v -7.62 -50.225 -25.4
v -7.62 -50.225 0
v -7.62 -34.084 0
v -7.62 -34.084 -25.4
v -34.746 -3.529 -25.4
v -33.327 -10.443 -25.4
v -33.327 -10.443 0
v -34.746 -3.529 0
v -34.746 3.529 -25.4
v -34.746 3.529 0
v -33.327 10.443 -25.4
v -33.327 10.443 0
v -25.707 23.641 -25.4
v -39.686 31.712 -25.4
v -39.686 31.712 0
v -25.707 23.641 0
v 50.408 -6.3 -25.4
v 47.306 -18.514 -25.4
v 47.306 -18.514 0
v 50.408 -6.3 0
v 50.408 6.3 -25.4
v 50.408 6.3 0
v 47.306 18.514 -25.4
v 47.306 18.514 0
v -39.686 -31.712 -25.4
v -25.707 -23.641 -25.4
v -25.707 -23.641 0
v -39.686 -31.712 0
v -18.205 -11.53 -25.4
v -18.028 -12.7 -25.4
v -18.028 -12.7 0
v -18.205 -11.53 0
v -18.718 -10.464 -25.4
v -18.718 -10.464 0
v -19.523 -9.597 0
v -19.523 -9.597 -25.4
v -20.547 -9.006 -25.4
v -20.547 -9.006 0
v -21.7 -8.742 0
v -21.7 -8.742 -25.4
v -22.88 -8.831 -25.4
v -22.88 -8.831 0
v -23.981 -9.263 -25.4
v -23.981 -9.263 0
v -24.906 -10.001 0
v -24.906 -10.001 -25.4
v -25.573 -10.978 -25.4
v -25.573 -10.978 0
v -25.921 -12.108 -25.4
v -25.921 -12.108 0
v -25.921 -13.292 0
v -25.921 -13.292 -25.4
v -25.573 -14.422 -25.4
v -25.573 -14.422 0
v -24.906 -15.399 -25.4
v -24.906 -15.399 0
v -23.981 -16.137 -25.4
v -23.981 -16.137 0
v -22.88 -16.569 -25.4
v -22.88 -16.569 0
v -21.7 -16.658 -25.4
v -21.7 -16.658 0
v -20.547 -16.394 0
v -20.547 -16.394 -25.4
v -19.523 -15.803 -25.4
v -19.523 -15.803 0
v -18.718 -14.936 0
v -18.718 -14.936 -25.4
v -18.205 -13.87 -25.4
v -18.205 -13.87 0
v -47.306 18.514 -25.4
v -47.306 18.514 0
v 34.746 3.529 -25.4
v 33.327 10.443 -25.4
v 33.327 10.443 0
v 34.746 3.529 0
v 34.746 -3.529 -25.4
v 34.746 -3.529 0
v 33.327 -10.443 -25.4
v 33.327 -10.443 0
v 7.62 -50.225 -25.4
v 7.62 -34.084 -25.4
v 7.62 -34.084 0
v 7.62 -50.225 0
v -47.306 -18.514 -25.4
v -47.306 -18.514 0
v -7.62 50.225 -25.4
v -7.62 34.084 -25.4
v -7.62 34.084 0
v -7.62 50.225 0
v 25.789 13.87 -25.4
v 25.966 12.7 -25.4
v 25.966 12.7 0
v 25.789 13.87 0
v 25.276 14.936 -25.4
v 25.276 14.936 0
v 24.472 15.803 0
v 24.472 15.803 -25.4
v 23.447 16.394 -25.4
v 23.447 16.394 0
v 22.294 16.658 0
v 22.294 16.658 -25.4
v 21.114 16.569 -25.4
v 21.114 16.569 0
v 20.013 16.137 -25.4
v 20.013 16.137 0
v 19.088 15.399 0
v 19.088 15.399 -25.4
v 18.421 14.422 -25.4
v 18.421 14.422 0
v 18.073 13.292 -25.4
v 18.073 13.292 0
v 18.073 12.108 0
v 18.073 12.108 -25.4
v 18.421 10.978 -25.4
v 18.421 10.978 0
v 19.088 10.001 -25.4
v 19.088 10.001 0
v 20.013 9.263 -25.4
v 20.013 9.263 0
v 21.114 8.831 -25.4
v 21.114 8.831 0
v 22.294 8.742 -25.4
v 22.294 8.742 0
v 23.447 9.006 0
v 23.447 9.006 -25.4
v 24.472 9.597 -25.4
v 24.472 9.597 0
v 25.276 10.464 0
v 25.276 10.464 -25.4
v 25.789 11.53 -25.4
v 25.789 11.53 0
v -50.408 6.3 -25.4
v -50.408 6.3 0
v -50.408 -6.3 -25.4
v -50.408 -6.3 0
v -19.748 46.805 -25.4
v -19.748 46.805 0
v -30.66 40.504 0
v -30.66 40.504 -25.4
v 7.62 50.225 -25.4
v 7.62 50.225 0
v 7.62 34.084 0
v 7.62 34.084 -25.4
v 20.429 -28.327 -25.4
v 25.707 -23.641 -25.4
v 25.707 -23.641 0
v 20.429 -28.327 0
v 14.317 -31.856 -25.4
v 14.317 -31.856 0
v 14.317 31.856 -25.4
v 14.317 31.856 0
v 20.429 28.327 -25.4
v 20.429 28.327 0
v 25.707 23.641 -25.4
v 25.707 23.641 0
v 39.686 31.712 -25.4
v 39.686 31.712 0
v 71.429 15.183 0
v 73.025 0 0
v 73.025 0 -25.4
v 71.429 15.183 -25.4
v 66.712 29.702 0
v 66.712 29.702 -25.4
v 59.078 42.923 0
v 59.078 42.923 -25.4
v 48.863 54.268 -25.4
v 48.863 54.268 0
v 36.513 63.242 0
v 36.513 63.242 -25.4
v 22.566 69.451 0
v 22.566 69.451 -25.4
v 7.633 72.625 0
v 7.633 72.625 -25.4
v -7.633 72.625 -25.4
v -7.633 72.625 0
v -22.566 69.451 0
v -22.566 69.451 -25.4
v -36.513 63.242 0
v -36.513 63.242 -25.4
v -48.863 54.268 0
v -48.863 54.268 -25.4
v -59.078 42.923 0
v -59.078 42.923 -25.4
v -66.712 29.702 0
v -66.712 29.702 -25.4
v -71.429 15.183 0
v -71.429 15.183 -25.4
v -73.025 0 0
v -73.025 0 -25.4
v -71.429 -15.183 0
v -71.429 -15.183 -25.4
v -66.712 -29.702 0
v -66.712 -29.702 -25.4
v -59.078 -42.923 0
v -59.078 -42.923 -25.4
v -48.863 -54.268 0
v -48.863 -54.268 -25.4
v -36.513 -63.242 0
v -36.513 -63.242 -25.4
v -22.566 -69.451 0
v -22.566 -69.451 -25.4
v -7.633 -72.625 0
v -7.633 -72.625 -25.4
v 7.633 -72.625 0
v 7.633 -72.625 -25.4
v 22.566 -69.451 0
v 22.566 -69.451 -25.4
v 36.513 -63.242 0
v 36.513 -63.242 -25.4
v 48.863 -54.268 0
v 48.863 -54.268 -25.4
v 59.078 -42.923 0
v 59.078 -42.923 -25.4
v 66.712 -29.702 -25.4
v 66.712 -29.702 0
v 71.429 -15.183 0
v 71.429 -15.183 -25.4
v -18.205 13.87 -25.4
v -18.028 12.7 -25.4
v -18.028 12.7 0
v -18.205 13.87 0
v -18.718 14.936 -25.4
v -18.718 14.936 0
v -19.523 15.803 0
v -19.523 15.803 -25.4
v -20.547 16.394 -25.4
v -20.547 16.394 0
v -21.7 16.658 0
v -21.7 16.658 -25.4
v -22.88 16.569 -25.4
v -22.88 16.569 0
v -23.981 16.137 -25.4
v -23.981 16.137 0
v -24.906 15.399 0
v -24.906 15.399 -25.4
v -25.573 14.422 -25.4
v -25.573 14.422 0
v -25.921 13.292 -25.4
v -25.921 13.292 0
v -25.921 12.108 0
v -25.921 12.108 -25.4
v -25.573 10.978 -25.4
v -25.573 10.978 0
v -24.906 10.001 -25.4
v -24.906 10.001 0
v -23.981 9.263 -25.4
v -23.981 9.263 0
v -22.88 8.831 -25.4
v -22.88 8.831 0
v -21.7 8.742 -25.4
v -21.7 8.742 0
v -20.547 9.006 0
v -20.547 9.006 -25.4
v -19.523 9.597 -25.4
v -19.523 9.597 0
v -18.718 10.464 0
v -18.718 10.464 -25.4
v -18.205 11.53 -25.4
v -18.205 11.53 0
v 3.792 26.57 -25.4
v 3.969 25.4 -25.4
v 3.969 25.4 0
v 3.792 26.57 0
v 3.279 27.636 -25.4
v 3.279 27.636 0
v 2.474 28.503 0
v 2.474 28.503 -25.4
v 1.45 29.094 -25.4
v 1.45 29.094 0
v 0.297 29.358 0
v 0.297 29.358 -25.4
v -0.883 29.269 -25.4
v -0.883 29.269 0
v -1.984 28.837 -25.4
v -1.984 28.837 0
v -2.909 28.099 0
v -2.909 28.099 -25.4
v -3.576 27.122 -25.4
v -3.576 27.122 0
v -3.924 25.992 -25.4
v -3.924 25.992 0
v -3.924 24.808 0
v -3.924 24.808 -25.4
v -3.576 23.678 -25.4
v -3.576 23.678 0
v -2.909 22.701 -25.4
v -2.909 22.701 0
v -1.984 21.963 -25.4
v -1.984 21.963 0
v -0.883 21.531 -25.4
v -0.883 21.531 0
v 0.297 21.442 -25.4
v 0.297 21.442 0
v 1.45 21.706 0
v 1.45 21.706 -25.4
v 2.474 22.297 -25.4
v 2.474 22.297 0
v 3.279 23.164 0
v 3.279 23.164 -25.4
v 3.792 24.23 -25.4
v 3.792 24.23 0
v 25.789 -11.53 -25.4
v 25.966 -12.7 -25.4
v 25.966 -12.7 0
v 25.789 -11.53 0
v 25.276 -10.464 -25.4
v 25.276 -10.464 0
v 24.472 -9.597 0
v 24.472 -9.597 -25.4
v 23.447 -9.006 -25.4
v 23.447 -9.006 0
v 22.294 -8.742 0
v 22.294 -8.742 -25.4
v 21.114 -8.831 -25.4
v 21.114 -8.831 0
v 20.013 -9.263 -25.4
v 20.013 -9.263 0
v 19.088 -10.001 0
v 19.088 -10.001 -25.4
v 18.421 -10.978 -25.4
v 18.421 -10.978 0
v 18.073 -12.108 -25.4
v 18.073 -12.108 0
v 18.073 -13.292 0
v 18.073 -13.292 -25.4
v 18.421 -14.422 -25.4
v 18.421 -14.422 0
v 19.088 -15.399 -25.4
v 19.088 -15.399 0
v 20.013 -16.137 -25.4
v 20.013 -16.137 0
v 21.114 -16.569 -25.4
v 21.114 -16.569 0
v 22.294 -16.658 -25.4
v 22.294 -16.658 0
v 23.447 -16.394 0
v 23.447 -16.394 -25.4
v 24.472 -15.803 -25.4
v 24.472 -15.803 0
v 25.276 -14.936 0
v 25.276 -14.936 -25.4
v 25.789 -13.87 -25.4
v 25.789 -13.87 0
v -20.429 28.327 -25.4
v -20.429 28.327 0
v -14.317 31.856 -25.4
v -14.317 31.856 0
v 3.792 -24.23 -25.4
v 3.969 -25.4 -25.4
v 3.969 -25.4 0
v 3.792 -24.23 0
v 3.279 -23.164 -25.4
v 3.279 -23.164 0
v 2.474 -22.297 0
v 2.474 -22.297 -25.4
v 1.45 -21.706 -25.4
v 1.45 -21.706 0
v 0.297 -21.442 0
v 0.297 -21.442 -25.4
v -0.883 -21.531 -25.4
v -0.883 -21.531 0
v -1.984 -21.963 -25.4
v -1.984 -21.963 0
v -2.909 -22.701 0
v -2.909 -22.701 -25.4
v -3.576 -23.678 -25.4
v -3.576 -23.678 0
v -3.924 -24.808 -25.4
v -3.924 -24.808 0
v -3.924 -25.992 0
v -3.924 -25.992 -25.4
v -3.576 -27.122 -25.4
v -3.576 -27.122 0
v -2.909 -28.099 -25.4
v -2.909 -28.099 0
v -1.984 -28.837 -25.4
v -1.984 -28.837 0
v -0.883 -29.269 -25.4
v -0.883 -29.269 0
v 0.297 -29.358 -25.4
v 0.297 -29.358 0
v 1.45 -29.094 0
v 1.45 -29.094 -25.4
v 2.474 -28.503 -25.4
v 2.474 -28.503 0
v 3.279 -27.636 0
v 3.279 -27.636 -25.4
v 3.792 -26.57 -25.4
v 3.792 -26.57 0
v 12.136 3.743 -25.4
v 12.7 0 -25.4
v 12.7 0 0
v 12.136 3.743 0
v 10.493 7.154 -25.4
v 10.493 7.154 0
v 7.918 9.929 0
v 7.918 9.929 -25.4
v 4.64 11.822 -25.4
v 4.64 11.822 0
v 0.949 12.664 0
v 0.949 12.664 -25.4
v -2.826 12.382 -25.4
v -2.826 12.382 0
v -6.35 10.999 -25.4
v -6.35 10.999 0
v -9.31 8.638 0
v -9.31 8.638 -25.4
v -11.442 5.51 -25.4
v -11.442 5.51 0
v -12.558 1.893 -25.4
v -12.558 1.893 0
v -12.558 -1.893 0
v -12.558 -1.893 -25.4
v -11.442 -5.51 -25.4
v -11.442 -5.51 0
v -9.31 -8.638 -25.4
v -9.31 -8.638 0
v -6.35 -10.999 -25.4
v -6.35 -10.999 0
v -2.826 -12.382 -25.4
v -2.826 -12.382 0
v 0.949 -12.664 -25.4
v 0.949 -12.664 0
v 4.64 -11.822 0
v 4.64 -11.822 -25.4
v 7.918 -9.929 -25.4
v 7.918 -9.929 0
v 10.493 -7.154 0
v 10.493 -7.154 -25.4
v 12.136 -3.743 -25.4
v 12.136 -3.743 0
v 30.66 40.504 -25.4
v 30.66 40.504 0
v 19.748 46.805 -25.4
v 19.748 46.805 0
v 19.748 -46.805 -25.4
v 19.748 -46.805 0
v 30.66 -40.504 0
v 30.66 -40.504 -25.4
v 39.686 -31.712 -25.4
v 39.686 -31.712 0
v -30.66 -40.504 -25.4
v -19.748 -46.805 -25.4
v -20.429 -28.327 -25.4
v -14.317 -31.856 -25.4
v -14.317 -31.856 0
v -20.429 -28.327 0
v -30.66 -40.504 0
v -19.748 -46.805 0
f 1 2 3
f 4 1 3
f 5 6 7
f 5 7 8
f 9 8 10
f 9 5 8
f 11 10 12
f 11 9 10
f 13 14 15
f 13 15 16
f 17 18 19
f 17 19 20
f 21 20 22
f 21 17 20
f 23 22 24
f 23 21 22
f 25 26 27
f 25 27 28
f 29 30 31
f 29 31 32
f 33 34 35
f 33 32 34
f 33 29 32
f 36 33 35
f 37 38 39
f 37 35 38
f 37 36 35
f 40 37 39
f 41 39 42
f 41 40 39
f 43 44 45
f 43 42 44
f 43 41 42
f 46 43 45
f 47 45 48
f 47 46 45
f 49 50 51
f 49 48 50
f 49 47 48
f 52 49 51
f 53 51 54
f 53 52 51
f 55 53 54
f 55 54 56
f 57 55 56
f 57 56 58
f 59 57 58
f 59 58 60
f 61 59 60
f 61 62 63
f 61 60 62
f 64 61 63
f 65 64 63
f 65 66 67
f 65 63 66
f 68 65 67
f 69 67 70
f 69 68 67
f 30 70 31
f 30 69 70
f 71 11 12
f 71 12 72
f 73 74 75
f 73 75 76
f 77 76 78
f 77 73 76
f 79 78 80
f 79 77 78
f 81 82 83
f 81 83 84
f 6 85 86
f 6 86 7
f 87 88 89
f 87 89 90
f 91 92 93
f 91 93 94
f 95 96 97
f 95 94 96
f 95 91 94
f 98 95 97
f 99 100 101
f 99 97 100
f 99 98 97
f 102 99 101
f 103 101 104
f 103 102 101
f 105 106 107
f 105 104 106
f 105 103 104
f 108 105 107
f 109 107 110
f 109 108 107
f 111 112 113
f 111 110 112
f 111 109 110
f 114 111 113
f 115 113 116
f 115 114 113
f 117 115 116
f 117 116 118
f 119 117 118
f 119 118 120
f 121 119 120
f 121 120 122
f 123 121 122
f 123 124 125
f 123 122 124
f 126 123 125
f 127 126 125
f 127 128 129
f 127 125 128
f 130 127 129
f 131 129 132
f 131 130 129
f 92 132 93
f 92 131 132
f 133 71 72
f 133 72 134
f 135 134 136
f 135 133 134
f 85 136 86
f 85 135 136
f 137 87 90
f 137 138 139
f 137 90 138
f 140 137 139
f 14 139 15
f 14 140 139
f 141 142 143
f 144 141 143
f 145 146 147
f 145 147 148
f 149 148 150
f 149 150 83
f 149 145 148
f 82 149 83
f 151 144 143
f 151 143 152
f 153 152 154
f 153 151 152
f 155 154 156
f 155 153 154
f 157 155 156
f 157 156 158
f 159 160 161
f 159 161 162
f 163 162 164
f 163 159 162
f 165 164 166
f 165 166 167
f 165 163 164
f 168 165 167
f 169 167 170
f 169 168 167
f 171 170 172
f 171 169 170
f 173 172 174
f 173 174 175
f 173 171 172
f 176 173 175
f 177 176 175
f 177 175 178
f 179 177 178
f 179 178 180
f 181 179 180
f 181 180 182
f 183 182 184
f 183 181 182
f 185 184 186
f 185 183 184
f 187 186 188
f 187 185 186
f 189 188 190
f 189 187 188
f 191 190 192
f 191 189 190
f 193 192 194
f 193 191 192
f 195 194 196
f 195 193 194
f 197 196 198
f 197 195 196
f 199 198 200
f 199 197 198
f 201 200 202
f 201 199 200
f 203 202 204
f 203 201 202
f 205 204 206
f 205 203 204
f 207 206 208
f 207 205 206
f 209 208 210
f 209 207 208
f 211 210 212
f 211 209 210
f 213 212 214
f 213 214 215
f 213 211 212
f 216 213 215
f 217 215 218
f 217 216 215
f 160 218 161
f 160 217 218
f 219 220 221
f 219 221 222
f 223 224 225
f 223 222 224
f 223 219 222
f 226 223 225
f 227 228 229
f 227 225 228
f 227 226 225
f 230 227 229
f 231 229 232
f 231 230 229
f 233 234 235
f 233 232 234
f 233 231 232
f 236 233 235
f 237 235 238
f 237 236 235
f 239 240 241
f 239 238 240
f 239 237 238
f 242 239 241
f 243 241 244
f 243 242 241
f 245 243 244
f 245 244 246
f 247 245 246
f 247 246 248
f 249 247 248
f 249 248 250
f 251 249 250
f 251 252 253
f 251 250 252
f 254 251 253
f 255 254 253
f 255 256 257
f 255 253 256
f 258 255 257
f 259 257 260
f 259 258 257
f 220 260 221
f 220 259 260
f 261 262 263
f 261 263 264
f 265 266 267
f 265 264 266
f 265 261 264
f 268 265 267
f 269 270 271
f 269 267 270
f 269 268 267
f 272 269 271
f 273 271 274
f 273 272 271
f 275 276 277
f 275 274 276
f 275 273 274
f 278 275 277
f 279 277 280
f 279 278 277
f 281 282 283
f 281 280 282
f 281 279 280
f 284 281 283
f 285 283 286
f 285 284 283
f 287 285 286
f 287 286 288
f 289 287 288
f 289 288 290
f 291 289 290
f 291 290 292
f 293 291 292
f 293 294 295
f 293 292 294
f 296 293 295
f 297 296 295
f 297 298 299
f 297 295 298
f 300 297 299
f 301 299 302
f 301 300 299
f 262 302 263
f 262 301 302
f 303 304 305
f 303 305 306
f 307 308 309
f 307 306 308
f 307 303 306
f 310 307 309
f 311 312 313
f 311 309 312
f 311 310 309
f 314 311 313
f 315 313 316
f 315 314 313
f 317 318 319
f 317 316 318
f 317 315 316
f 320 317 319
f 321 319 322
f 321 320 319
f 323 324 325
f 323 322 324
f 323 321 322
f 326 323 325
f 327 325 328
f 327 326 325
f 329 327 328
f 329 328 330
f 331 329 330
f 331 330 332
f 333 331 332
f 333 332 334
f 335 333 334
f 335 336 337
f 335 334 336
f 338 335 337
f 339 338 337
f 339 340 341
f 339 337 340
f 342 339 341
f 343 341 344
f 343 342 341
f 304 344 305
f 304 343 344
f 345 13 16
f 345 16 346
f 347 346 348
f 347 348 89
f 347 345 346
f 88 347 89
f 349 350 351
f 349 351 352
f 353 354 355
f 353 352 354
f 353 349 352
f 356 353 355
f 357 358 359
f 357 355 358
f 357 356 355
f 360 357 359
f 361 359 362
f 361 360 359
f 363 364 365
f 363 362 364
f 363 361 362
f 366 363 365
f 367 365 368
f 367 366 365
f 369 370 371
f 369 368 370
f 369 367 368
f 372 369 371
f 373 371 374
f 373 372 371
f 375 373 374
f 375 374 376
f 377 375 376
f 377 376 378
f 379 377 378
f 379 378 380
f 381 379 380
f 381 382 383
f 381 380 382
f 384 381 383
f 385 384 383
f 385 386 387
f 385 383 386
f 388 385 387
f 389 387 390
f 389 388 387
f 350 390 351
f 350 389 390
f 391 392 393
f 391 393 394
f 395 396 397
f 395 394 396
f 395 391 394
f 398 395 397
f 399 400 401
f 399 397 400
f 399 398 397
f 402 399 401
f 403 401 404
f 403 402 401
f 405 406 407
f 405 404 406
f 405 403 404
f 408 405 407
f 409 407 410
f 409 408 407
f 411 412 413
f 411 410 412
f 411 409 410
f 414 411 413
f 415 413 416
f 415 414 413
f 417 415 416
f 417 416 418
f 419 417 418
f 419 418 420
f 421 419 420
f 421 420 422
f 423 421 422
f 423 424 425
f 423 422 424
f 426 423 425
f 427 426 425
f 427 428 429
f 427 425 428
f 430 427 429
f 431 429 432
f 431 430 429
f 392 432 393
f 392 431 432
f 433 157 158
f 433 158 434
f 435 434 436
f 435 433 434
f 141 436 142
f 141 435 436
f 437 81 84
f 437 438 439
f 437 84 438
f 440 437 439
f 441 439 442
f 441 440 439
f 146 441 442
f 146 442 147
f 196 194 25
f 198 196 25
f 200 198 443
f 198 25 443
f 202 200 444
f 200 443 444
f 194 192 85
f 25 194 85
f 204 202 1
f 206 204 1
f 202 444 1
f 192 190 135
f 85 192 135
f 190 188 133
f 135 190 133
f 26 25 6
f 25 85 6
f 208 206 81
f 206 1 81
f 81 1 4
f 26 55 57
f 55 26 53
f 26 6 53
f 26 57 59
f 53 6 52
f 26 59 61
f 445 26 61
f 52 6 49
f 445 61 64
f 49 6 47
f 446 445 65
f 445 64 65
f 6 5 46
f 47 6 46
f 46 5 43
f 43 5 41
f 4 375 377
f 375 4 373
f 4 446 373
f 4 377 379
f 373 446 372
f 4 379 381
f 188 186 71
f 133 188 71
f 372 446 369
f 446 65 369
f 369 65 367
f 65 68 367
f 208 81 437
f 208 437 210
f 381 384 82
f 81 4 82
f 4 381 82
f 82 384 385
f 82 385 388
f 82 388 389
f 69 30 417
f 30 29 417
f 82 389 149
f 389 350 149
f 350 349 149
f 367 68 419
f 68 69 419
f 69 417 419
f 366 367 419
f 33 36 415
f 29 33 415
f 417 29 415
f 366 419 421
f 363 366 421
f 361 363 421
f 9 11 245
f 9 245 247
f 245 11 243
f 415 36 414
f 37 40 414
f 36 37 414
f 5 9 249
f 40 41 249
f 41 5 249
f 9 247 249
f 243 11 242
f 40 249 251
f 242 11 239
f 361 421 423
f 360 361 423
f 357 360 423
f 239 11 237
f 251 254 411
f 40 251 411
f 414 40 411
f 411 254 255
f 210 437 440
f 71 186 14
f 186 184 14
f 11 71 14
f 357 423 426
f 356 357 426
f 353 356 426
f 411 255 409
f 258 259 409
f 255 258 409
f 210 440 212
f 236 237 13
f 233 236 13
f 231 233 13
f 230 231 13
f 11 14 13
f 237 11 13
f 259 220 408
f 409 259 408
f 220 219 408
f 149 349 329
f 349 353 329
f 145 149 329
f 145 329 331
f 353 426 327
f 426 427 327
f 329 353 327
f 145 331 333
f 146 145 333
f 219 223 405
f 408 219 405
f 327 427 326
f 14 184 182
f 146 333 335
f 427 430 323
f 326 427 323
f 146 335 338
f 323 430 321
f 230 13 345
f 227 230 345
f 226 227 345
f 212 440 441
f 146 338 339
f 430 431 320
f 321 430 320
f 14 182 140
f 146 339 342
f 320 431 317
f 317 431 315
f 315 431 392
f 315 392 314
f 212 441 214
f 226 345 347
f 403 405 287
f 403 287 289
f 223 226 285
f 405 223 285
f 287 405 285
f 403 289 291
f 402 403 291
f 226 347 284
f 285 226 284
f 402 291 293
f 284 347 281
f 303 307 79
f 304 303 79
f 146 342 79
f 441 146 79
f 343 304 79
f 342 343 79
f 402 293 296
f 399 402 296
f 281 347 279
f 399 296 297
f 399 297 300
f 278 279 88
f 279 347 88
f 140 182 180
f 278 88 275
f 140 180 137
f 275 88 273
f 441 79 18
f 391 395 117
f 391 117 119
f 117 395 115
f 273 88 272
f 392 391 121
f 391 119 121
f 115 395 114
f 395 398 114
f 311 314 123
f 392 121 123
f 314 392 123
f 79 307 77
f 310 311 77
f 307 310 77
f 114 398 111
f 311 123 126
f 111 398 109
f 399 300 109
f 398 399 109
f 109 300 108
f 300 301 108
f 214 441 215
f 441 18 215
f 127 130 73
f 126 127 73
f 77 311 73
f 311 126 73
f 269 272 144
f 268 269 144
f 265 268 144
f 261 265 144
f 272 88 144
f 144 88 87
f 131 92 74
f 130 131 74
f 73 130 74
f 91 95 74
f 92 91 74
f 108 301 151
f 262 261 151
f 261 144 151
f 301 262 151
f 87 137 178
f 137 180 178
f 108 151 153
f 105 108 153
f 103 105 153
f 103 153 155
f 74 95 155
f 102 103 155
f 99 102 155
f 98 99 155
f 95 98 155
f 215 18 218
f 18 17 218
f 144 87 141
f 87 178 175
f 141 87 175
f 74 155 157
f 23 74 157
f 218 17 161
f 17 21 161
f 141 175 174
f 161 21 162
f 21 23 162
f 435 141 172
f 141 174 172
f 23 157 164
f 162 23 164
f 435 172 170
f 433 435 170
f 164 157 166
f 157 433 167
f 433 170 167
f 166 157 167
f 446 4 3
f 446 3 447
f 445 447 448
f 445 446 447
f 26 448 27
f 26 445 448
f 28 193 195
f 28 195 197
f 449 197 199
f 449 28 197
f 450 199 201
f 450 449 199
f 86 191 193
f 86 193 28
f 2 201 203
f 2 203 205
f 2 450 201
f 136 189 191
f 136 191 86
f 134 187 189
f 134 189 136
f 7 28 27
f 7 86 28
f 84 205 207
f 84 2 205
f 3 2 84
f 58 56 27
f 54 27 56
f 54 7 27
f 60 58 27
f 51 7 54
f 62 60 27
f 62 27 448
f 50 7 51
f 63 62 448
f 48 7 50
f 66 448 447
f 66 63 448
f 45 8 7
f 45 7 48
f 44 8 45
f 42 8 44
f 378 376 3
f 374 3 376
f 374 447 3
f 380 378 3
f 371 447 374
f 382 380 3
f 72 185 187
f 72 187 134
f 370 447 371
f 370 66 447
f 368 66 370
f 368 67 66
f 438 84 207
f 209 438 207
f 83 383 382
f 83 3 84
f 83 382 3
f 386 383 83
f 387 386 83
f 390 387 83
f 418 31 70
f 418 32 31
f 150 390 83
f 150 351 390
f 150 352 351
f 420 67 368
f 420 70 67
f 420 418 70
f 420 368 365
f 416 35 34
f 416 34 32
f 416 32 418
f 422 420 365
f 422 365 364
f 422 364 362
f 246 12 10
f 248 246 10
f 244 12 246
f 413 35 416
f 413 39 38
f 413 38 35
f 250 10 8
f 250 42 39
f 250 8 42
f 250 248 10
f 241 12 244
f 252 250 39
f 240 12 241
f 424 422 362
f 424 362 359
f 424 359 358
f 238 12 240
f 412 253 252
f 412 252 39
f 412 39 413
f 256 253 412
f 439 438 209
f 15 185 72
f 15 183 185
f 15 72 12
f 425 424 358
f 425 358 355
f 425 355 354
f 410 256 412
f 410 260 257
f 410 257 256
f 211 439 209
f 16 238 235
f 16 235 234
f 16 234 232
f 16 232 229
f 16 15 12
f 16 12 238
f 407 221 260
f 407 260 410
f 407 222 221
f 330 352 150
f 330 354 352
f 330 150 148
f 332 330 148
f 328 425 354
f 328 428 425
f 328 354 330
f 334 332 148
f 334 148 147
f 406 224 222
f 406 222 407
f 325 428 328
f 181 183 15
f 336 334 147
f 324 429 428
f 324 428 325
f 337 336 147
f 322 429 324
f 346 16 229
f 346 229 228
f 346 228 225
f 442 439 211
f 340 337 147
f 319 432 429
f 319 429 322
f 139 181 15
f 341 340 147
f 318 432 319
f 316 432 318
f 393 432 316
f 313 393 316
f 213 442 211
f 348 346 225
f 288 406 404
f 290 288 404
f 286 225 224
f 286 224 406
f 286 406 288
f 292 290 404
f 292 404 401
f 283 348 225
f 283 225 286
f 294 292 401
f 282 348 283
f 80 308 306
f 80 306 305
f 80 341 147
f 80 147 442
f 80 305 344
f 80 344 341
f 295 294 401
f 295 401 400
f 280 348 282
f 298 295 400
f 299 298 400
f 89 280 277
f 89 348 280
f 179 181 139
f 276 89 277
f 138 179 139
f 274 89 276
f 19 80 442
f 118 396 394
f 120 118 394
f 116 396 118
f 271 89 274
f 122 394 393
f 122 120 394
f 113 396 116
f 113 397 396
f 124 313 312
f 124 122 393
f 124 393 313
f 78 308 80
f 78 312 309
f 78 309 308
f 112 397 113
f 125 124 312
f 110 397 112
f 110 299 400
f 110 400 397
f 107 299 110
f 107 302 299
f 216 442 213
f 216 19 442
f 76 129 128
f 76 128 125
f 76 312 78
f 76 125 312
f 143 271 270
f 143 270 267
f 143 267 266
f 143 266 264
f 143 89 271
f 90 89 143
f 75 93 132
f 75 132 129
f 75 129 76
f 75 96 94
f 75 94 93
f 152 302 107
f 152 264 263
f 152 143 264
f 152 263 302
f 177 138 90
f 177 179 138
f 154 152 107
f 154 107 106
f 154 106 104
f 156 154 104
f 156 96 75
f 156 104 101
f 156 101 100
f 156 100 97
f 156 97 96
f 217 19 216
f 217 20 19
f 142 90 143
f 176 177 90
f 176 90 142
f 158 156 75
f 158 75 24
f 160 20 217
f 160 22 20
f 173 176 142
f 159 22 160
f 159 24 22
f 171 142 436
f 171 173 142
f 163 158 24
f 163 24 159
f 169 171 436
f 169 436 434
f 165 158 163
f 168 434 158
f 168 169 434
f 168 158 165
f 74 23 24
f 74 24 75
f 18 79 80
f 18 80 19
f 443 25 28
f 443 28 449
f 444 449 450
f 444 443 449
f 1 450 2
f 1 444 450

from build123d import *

# Parameters (mm, degrees)
SKETCH3_R               = 73.025
BOSS_EXTRUDE2_DEPTH     = 25.4
CUT_EXTRUDE1_DEPTH      = 107.350652325
CUT_EXTRUDE1_DEPTH_BACK = 107.350652325
SKETCH4_R               = 3.96875
SKETCH4_R_2             = 12.7


with BuildPart() as part:
    # Sketch3 → Boss-Extrude2 (new body)
    with BuildSketch(Plane.XY):
        Circle(SKETCH3_R)
    extrude(amount=-BOSS_EXTRUDE2_DEPTH)

    # Sketch4 → Cut-Extrude1 (cut, two sides: drawn at the far end of the back side and taken through both)
    with BuildSketch(Plane.XY.offset(-CUT_EXTRUDE1_DEPTH_BACK)):
        with BuildLine():
            ThreePointArc((-39.686341225, -31.711737892), (-25.4, -43.994090512), (-7.62, -50.225248631))
            Line((-7.62, -50.225248631), (-7.62, -34.083591727))
            ThreePointArc((-7.62, -34.083591727), (-17.4625, -30.245937227), (-25.707256288, -23.64090944))
            Line((-25.707256288, -23.64090944), (-39.686341225, -31.711737892))
        make_face()
        with BuildLine():
            Line((7.62, -34.083591727), (7.62, -50.225248631))
            ThreePointArc((7.62, -50.225248631), (25.4, -43.994090512), (39.686341225, -31.711737892))
            Line((39.686341225, -31.711737892), (25.707256288, -23.64090944))
            ThreePointArc((25.707256288, -23.64090944), (17.4625, -30.245937227), (7.62, -34.083591727))
        make_face()
        with Locations((0, -25.4)):
            Circle(SKETCH4_R)
        with BuildLine():
            ThreePointArc((-47.306341225, 18.513510738), (-50.8, 0), (-47.306341225, -18.513510738))
            Line((-47.306341225, -18.513510738), (-33.327256288, -10.442682287))
            ThreePointArc((-33.327256288, -10.442682287), (-34.925, 0), (-33.327256288, 10.442682287))
            Line((-33.327256288, 10.442682287), (-47.306341225, 18.513510738))
        make_face()
        with BuildLine():
            Line((33.327256288, -10.442682287), (47.306341225, -18.513510738))
            ThreePointArc((47.306341225, -18.513510738), (50.8, 0), (47.306341225, 18.513510738))
            Line((47.306341225, 18.513510738), (33.327256288, 10.442682287))
            ThreePointArc((33.327256288, 10.442682287), (34.925, 0), (33.327256288, -10.442682287))
        make_face()
        Circle(SKETCH4_R_2)
        with Locations((-21.997045256, -12.7)):
            Circle(SKETCH4_R)
        with Locations((21.997045256, -12.7)):
            Circle(SKETCH4_R)
        with BuildLine():
            ThreePointArc((-7.62, 50.225248631), (-25.4, 43.994090512), (-39.686341225, 31.711737892))
            Line((-39.686341225, 31.711737892), (-25.707256288, 23.64090944))
            ThreePointArc((-25.707256288, 23.64090944), (-17.4625, 30.245937227), (-7.62, 34.083591727))
            Line((-7.62, 34.083591727), (-7.62, 50.225248631))
        make_face()
        with Locations((-21.997045256, 12.7)):
            Circle(SKETCH4_R)
        with Locations((21.997045256, 12.7)):
            Circle(SKETCH4_R)
        with BuildLine():
            Line((25.707256288, 23.64090944), (39.686341225, 31.711737892))
            ThreePointArc((39.686341225, 31.711737892), (25.4, 43.994090512), (7.62, 50.225248631))
            Line((7.62, 50.225248631), (7.62, 34.083591727))
            ThreePointArc((7.62, 34.083591727), (17.4625, 30.245937227), (25.707256288, 23.64090944))
        make_face()
        with Locations((0, 25.4)):
            Circle(SKETCH4_R)
    extrude(amount=CUT_EXTRUDE1_DEPTH + CUT_EXTRUDE1_DEPTH_BACK, mode=Mode.SUBTRACT)


solid = part.part
